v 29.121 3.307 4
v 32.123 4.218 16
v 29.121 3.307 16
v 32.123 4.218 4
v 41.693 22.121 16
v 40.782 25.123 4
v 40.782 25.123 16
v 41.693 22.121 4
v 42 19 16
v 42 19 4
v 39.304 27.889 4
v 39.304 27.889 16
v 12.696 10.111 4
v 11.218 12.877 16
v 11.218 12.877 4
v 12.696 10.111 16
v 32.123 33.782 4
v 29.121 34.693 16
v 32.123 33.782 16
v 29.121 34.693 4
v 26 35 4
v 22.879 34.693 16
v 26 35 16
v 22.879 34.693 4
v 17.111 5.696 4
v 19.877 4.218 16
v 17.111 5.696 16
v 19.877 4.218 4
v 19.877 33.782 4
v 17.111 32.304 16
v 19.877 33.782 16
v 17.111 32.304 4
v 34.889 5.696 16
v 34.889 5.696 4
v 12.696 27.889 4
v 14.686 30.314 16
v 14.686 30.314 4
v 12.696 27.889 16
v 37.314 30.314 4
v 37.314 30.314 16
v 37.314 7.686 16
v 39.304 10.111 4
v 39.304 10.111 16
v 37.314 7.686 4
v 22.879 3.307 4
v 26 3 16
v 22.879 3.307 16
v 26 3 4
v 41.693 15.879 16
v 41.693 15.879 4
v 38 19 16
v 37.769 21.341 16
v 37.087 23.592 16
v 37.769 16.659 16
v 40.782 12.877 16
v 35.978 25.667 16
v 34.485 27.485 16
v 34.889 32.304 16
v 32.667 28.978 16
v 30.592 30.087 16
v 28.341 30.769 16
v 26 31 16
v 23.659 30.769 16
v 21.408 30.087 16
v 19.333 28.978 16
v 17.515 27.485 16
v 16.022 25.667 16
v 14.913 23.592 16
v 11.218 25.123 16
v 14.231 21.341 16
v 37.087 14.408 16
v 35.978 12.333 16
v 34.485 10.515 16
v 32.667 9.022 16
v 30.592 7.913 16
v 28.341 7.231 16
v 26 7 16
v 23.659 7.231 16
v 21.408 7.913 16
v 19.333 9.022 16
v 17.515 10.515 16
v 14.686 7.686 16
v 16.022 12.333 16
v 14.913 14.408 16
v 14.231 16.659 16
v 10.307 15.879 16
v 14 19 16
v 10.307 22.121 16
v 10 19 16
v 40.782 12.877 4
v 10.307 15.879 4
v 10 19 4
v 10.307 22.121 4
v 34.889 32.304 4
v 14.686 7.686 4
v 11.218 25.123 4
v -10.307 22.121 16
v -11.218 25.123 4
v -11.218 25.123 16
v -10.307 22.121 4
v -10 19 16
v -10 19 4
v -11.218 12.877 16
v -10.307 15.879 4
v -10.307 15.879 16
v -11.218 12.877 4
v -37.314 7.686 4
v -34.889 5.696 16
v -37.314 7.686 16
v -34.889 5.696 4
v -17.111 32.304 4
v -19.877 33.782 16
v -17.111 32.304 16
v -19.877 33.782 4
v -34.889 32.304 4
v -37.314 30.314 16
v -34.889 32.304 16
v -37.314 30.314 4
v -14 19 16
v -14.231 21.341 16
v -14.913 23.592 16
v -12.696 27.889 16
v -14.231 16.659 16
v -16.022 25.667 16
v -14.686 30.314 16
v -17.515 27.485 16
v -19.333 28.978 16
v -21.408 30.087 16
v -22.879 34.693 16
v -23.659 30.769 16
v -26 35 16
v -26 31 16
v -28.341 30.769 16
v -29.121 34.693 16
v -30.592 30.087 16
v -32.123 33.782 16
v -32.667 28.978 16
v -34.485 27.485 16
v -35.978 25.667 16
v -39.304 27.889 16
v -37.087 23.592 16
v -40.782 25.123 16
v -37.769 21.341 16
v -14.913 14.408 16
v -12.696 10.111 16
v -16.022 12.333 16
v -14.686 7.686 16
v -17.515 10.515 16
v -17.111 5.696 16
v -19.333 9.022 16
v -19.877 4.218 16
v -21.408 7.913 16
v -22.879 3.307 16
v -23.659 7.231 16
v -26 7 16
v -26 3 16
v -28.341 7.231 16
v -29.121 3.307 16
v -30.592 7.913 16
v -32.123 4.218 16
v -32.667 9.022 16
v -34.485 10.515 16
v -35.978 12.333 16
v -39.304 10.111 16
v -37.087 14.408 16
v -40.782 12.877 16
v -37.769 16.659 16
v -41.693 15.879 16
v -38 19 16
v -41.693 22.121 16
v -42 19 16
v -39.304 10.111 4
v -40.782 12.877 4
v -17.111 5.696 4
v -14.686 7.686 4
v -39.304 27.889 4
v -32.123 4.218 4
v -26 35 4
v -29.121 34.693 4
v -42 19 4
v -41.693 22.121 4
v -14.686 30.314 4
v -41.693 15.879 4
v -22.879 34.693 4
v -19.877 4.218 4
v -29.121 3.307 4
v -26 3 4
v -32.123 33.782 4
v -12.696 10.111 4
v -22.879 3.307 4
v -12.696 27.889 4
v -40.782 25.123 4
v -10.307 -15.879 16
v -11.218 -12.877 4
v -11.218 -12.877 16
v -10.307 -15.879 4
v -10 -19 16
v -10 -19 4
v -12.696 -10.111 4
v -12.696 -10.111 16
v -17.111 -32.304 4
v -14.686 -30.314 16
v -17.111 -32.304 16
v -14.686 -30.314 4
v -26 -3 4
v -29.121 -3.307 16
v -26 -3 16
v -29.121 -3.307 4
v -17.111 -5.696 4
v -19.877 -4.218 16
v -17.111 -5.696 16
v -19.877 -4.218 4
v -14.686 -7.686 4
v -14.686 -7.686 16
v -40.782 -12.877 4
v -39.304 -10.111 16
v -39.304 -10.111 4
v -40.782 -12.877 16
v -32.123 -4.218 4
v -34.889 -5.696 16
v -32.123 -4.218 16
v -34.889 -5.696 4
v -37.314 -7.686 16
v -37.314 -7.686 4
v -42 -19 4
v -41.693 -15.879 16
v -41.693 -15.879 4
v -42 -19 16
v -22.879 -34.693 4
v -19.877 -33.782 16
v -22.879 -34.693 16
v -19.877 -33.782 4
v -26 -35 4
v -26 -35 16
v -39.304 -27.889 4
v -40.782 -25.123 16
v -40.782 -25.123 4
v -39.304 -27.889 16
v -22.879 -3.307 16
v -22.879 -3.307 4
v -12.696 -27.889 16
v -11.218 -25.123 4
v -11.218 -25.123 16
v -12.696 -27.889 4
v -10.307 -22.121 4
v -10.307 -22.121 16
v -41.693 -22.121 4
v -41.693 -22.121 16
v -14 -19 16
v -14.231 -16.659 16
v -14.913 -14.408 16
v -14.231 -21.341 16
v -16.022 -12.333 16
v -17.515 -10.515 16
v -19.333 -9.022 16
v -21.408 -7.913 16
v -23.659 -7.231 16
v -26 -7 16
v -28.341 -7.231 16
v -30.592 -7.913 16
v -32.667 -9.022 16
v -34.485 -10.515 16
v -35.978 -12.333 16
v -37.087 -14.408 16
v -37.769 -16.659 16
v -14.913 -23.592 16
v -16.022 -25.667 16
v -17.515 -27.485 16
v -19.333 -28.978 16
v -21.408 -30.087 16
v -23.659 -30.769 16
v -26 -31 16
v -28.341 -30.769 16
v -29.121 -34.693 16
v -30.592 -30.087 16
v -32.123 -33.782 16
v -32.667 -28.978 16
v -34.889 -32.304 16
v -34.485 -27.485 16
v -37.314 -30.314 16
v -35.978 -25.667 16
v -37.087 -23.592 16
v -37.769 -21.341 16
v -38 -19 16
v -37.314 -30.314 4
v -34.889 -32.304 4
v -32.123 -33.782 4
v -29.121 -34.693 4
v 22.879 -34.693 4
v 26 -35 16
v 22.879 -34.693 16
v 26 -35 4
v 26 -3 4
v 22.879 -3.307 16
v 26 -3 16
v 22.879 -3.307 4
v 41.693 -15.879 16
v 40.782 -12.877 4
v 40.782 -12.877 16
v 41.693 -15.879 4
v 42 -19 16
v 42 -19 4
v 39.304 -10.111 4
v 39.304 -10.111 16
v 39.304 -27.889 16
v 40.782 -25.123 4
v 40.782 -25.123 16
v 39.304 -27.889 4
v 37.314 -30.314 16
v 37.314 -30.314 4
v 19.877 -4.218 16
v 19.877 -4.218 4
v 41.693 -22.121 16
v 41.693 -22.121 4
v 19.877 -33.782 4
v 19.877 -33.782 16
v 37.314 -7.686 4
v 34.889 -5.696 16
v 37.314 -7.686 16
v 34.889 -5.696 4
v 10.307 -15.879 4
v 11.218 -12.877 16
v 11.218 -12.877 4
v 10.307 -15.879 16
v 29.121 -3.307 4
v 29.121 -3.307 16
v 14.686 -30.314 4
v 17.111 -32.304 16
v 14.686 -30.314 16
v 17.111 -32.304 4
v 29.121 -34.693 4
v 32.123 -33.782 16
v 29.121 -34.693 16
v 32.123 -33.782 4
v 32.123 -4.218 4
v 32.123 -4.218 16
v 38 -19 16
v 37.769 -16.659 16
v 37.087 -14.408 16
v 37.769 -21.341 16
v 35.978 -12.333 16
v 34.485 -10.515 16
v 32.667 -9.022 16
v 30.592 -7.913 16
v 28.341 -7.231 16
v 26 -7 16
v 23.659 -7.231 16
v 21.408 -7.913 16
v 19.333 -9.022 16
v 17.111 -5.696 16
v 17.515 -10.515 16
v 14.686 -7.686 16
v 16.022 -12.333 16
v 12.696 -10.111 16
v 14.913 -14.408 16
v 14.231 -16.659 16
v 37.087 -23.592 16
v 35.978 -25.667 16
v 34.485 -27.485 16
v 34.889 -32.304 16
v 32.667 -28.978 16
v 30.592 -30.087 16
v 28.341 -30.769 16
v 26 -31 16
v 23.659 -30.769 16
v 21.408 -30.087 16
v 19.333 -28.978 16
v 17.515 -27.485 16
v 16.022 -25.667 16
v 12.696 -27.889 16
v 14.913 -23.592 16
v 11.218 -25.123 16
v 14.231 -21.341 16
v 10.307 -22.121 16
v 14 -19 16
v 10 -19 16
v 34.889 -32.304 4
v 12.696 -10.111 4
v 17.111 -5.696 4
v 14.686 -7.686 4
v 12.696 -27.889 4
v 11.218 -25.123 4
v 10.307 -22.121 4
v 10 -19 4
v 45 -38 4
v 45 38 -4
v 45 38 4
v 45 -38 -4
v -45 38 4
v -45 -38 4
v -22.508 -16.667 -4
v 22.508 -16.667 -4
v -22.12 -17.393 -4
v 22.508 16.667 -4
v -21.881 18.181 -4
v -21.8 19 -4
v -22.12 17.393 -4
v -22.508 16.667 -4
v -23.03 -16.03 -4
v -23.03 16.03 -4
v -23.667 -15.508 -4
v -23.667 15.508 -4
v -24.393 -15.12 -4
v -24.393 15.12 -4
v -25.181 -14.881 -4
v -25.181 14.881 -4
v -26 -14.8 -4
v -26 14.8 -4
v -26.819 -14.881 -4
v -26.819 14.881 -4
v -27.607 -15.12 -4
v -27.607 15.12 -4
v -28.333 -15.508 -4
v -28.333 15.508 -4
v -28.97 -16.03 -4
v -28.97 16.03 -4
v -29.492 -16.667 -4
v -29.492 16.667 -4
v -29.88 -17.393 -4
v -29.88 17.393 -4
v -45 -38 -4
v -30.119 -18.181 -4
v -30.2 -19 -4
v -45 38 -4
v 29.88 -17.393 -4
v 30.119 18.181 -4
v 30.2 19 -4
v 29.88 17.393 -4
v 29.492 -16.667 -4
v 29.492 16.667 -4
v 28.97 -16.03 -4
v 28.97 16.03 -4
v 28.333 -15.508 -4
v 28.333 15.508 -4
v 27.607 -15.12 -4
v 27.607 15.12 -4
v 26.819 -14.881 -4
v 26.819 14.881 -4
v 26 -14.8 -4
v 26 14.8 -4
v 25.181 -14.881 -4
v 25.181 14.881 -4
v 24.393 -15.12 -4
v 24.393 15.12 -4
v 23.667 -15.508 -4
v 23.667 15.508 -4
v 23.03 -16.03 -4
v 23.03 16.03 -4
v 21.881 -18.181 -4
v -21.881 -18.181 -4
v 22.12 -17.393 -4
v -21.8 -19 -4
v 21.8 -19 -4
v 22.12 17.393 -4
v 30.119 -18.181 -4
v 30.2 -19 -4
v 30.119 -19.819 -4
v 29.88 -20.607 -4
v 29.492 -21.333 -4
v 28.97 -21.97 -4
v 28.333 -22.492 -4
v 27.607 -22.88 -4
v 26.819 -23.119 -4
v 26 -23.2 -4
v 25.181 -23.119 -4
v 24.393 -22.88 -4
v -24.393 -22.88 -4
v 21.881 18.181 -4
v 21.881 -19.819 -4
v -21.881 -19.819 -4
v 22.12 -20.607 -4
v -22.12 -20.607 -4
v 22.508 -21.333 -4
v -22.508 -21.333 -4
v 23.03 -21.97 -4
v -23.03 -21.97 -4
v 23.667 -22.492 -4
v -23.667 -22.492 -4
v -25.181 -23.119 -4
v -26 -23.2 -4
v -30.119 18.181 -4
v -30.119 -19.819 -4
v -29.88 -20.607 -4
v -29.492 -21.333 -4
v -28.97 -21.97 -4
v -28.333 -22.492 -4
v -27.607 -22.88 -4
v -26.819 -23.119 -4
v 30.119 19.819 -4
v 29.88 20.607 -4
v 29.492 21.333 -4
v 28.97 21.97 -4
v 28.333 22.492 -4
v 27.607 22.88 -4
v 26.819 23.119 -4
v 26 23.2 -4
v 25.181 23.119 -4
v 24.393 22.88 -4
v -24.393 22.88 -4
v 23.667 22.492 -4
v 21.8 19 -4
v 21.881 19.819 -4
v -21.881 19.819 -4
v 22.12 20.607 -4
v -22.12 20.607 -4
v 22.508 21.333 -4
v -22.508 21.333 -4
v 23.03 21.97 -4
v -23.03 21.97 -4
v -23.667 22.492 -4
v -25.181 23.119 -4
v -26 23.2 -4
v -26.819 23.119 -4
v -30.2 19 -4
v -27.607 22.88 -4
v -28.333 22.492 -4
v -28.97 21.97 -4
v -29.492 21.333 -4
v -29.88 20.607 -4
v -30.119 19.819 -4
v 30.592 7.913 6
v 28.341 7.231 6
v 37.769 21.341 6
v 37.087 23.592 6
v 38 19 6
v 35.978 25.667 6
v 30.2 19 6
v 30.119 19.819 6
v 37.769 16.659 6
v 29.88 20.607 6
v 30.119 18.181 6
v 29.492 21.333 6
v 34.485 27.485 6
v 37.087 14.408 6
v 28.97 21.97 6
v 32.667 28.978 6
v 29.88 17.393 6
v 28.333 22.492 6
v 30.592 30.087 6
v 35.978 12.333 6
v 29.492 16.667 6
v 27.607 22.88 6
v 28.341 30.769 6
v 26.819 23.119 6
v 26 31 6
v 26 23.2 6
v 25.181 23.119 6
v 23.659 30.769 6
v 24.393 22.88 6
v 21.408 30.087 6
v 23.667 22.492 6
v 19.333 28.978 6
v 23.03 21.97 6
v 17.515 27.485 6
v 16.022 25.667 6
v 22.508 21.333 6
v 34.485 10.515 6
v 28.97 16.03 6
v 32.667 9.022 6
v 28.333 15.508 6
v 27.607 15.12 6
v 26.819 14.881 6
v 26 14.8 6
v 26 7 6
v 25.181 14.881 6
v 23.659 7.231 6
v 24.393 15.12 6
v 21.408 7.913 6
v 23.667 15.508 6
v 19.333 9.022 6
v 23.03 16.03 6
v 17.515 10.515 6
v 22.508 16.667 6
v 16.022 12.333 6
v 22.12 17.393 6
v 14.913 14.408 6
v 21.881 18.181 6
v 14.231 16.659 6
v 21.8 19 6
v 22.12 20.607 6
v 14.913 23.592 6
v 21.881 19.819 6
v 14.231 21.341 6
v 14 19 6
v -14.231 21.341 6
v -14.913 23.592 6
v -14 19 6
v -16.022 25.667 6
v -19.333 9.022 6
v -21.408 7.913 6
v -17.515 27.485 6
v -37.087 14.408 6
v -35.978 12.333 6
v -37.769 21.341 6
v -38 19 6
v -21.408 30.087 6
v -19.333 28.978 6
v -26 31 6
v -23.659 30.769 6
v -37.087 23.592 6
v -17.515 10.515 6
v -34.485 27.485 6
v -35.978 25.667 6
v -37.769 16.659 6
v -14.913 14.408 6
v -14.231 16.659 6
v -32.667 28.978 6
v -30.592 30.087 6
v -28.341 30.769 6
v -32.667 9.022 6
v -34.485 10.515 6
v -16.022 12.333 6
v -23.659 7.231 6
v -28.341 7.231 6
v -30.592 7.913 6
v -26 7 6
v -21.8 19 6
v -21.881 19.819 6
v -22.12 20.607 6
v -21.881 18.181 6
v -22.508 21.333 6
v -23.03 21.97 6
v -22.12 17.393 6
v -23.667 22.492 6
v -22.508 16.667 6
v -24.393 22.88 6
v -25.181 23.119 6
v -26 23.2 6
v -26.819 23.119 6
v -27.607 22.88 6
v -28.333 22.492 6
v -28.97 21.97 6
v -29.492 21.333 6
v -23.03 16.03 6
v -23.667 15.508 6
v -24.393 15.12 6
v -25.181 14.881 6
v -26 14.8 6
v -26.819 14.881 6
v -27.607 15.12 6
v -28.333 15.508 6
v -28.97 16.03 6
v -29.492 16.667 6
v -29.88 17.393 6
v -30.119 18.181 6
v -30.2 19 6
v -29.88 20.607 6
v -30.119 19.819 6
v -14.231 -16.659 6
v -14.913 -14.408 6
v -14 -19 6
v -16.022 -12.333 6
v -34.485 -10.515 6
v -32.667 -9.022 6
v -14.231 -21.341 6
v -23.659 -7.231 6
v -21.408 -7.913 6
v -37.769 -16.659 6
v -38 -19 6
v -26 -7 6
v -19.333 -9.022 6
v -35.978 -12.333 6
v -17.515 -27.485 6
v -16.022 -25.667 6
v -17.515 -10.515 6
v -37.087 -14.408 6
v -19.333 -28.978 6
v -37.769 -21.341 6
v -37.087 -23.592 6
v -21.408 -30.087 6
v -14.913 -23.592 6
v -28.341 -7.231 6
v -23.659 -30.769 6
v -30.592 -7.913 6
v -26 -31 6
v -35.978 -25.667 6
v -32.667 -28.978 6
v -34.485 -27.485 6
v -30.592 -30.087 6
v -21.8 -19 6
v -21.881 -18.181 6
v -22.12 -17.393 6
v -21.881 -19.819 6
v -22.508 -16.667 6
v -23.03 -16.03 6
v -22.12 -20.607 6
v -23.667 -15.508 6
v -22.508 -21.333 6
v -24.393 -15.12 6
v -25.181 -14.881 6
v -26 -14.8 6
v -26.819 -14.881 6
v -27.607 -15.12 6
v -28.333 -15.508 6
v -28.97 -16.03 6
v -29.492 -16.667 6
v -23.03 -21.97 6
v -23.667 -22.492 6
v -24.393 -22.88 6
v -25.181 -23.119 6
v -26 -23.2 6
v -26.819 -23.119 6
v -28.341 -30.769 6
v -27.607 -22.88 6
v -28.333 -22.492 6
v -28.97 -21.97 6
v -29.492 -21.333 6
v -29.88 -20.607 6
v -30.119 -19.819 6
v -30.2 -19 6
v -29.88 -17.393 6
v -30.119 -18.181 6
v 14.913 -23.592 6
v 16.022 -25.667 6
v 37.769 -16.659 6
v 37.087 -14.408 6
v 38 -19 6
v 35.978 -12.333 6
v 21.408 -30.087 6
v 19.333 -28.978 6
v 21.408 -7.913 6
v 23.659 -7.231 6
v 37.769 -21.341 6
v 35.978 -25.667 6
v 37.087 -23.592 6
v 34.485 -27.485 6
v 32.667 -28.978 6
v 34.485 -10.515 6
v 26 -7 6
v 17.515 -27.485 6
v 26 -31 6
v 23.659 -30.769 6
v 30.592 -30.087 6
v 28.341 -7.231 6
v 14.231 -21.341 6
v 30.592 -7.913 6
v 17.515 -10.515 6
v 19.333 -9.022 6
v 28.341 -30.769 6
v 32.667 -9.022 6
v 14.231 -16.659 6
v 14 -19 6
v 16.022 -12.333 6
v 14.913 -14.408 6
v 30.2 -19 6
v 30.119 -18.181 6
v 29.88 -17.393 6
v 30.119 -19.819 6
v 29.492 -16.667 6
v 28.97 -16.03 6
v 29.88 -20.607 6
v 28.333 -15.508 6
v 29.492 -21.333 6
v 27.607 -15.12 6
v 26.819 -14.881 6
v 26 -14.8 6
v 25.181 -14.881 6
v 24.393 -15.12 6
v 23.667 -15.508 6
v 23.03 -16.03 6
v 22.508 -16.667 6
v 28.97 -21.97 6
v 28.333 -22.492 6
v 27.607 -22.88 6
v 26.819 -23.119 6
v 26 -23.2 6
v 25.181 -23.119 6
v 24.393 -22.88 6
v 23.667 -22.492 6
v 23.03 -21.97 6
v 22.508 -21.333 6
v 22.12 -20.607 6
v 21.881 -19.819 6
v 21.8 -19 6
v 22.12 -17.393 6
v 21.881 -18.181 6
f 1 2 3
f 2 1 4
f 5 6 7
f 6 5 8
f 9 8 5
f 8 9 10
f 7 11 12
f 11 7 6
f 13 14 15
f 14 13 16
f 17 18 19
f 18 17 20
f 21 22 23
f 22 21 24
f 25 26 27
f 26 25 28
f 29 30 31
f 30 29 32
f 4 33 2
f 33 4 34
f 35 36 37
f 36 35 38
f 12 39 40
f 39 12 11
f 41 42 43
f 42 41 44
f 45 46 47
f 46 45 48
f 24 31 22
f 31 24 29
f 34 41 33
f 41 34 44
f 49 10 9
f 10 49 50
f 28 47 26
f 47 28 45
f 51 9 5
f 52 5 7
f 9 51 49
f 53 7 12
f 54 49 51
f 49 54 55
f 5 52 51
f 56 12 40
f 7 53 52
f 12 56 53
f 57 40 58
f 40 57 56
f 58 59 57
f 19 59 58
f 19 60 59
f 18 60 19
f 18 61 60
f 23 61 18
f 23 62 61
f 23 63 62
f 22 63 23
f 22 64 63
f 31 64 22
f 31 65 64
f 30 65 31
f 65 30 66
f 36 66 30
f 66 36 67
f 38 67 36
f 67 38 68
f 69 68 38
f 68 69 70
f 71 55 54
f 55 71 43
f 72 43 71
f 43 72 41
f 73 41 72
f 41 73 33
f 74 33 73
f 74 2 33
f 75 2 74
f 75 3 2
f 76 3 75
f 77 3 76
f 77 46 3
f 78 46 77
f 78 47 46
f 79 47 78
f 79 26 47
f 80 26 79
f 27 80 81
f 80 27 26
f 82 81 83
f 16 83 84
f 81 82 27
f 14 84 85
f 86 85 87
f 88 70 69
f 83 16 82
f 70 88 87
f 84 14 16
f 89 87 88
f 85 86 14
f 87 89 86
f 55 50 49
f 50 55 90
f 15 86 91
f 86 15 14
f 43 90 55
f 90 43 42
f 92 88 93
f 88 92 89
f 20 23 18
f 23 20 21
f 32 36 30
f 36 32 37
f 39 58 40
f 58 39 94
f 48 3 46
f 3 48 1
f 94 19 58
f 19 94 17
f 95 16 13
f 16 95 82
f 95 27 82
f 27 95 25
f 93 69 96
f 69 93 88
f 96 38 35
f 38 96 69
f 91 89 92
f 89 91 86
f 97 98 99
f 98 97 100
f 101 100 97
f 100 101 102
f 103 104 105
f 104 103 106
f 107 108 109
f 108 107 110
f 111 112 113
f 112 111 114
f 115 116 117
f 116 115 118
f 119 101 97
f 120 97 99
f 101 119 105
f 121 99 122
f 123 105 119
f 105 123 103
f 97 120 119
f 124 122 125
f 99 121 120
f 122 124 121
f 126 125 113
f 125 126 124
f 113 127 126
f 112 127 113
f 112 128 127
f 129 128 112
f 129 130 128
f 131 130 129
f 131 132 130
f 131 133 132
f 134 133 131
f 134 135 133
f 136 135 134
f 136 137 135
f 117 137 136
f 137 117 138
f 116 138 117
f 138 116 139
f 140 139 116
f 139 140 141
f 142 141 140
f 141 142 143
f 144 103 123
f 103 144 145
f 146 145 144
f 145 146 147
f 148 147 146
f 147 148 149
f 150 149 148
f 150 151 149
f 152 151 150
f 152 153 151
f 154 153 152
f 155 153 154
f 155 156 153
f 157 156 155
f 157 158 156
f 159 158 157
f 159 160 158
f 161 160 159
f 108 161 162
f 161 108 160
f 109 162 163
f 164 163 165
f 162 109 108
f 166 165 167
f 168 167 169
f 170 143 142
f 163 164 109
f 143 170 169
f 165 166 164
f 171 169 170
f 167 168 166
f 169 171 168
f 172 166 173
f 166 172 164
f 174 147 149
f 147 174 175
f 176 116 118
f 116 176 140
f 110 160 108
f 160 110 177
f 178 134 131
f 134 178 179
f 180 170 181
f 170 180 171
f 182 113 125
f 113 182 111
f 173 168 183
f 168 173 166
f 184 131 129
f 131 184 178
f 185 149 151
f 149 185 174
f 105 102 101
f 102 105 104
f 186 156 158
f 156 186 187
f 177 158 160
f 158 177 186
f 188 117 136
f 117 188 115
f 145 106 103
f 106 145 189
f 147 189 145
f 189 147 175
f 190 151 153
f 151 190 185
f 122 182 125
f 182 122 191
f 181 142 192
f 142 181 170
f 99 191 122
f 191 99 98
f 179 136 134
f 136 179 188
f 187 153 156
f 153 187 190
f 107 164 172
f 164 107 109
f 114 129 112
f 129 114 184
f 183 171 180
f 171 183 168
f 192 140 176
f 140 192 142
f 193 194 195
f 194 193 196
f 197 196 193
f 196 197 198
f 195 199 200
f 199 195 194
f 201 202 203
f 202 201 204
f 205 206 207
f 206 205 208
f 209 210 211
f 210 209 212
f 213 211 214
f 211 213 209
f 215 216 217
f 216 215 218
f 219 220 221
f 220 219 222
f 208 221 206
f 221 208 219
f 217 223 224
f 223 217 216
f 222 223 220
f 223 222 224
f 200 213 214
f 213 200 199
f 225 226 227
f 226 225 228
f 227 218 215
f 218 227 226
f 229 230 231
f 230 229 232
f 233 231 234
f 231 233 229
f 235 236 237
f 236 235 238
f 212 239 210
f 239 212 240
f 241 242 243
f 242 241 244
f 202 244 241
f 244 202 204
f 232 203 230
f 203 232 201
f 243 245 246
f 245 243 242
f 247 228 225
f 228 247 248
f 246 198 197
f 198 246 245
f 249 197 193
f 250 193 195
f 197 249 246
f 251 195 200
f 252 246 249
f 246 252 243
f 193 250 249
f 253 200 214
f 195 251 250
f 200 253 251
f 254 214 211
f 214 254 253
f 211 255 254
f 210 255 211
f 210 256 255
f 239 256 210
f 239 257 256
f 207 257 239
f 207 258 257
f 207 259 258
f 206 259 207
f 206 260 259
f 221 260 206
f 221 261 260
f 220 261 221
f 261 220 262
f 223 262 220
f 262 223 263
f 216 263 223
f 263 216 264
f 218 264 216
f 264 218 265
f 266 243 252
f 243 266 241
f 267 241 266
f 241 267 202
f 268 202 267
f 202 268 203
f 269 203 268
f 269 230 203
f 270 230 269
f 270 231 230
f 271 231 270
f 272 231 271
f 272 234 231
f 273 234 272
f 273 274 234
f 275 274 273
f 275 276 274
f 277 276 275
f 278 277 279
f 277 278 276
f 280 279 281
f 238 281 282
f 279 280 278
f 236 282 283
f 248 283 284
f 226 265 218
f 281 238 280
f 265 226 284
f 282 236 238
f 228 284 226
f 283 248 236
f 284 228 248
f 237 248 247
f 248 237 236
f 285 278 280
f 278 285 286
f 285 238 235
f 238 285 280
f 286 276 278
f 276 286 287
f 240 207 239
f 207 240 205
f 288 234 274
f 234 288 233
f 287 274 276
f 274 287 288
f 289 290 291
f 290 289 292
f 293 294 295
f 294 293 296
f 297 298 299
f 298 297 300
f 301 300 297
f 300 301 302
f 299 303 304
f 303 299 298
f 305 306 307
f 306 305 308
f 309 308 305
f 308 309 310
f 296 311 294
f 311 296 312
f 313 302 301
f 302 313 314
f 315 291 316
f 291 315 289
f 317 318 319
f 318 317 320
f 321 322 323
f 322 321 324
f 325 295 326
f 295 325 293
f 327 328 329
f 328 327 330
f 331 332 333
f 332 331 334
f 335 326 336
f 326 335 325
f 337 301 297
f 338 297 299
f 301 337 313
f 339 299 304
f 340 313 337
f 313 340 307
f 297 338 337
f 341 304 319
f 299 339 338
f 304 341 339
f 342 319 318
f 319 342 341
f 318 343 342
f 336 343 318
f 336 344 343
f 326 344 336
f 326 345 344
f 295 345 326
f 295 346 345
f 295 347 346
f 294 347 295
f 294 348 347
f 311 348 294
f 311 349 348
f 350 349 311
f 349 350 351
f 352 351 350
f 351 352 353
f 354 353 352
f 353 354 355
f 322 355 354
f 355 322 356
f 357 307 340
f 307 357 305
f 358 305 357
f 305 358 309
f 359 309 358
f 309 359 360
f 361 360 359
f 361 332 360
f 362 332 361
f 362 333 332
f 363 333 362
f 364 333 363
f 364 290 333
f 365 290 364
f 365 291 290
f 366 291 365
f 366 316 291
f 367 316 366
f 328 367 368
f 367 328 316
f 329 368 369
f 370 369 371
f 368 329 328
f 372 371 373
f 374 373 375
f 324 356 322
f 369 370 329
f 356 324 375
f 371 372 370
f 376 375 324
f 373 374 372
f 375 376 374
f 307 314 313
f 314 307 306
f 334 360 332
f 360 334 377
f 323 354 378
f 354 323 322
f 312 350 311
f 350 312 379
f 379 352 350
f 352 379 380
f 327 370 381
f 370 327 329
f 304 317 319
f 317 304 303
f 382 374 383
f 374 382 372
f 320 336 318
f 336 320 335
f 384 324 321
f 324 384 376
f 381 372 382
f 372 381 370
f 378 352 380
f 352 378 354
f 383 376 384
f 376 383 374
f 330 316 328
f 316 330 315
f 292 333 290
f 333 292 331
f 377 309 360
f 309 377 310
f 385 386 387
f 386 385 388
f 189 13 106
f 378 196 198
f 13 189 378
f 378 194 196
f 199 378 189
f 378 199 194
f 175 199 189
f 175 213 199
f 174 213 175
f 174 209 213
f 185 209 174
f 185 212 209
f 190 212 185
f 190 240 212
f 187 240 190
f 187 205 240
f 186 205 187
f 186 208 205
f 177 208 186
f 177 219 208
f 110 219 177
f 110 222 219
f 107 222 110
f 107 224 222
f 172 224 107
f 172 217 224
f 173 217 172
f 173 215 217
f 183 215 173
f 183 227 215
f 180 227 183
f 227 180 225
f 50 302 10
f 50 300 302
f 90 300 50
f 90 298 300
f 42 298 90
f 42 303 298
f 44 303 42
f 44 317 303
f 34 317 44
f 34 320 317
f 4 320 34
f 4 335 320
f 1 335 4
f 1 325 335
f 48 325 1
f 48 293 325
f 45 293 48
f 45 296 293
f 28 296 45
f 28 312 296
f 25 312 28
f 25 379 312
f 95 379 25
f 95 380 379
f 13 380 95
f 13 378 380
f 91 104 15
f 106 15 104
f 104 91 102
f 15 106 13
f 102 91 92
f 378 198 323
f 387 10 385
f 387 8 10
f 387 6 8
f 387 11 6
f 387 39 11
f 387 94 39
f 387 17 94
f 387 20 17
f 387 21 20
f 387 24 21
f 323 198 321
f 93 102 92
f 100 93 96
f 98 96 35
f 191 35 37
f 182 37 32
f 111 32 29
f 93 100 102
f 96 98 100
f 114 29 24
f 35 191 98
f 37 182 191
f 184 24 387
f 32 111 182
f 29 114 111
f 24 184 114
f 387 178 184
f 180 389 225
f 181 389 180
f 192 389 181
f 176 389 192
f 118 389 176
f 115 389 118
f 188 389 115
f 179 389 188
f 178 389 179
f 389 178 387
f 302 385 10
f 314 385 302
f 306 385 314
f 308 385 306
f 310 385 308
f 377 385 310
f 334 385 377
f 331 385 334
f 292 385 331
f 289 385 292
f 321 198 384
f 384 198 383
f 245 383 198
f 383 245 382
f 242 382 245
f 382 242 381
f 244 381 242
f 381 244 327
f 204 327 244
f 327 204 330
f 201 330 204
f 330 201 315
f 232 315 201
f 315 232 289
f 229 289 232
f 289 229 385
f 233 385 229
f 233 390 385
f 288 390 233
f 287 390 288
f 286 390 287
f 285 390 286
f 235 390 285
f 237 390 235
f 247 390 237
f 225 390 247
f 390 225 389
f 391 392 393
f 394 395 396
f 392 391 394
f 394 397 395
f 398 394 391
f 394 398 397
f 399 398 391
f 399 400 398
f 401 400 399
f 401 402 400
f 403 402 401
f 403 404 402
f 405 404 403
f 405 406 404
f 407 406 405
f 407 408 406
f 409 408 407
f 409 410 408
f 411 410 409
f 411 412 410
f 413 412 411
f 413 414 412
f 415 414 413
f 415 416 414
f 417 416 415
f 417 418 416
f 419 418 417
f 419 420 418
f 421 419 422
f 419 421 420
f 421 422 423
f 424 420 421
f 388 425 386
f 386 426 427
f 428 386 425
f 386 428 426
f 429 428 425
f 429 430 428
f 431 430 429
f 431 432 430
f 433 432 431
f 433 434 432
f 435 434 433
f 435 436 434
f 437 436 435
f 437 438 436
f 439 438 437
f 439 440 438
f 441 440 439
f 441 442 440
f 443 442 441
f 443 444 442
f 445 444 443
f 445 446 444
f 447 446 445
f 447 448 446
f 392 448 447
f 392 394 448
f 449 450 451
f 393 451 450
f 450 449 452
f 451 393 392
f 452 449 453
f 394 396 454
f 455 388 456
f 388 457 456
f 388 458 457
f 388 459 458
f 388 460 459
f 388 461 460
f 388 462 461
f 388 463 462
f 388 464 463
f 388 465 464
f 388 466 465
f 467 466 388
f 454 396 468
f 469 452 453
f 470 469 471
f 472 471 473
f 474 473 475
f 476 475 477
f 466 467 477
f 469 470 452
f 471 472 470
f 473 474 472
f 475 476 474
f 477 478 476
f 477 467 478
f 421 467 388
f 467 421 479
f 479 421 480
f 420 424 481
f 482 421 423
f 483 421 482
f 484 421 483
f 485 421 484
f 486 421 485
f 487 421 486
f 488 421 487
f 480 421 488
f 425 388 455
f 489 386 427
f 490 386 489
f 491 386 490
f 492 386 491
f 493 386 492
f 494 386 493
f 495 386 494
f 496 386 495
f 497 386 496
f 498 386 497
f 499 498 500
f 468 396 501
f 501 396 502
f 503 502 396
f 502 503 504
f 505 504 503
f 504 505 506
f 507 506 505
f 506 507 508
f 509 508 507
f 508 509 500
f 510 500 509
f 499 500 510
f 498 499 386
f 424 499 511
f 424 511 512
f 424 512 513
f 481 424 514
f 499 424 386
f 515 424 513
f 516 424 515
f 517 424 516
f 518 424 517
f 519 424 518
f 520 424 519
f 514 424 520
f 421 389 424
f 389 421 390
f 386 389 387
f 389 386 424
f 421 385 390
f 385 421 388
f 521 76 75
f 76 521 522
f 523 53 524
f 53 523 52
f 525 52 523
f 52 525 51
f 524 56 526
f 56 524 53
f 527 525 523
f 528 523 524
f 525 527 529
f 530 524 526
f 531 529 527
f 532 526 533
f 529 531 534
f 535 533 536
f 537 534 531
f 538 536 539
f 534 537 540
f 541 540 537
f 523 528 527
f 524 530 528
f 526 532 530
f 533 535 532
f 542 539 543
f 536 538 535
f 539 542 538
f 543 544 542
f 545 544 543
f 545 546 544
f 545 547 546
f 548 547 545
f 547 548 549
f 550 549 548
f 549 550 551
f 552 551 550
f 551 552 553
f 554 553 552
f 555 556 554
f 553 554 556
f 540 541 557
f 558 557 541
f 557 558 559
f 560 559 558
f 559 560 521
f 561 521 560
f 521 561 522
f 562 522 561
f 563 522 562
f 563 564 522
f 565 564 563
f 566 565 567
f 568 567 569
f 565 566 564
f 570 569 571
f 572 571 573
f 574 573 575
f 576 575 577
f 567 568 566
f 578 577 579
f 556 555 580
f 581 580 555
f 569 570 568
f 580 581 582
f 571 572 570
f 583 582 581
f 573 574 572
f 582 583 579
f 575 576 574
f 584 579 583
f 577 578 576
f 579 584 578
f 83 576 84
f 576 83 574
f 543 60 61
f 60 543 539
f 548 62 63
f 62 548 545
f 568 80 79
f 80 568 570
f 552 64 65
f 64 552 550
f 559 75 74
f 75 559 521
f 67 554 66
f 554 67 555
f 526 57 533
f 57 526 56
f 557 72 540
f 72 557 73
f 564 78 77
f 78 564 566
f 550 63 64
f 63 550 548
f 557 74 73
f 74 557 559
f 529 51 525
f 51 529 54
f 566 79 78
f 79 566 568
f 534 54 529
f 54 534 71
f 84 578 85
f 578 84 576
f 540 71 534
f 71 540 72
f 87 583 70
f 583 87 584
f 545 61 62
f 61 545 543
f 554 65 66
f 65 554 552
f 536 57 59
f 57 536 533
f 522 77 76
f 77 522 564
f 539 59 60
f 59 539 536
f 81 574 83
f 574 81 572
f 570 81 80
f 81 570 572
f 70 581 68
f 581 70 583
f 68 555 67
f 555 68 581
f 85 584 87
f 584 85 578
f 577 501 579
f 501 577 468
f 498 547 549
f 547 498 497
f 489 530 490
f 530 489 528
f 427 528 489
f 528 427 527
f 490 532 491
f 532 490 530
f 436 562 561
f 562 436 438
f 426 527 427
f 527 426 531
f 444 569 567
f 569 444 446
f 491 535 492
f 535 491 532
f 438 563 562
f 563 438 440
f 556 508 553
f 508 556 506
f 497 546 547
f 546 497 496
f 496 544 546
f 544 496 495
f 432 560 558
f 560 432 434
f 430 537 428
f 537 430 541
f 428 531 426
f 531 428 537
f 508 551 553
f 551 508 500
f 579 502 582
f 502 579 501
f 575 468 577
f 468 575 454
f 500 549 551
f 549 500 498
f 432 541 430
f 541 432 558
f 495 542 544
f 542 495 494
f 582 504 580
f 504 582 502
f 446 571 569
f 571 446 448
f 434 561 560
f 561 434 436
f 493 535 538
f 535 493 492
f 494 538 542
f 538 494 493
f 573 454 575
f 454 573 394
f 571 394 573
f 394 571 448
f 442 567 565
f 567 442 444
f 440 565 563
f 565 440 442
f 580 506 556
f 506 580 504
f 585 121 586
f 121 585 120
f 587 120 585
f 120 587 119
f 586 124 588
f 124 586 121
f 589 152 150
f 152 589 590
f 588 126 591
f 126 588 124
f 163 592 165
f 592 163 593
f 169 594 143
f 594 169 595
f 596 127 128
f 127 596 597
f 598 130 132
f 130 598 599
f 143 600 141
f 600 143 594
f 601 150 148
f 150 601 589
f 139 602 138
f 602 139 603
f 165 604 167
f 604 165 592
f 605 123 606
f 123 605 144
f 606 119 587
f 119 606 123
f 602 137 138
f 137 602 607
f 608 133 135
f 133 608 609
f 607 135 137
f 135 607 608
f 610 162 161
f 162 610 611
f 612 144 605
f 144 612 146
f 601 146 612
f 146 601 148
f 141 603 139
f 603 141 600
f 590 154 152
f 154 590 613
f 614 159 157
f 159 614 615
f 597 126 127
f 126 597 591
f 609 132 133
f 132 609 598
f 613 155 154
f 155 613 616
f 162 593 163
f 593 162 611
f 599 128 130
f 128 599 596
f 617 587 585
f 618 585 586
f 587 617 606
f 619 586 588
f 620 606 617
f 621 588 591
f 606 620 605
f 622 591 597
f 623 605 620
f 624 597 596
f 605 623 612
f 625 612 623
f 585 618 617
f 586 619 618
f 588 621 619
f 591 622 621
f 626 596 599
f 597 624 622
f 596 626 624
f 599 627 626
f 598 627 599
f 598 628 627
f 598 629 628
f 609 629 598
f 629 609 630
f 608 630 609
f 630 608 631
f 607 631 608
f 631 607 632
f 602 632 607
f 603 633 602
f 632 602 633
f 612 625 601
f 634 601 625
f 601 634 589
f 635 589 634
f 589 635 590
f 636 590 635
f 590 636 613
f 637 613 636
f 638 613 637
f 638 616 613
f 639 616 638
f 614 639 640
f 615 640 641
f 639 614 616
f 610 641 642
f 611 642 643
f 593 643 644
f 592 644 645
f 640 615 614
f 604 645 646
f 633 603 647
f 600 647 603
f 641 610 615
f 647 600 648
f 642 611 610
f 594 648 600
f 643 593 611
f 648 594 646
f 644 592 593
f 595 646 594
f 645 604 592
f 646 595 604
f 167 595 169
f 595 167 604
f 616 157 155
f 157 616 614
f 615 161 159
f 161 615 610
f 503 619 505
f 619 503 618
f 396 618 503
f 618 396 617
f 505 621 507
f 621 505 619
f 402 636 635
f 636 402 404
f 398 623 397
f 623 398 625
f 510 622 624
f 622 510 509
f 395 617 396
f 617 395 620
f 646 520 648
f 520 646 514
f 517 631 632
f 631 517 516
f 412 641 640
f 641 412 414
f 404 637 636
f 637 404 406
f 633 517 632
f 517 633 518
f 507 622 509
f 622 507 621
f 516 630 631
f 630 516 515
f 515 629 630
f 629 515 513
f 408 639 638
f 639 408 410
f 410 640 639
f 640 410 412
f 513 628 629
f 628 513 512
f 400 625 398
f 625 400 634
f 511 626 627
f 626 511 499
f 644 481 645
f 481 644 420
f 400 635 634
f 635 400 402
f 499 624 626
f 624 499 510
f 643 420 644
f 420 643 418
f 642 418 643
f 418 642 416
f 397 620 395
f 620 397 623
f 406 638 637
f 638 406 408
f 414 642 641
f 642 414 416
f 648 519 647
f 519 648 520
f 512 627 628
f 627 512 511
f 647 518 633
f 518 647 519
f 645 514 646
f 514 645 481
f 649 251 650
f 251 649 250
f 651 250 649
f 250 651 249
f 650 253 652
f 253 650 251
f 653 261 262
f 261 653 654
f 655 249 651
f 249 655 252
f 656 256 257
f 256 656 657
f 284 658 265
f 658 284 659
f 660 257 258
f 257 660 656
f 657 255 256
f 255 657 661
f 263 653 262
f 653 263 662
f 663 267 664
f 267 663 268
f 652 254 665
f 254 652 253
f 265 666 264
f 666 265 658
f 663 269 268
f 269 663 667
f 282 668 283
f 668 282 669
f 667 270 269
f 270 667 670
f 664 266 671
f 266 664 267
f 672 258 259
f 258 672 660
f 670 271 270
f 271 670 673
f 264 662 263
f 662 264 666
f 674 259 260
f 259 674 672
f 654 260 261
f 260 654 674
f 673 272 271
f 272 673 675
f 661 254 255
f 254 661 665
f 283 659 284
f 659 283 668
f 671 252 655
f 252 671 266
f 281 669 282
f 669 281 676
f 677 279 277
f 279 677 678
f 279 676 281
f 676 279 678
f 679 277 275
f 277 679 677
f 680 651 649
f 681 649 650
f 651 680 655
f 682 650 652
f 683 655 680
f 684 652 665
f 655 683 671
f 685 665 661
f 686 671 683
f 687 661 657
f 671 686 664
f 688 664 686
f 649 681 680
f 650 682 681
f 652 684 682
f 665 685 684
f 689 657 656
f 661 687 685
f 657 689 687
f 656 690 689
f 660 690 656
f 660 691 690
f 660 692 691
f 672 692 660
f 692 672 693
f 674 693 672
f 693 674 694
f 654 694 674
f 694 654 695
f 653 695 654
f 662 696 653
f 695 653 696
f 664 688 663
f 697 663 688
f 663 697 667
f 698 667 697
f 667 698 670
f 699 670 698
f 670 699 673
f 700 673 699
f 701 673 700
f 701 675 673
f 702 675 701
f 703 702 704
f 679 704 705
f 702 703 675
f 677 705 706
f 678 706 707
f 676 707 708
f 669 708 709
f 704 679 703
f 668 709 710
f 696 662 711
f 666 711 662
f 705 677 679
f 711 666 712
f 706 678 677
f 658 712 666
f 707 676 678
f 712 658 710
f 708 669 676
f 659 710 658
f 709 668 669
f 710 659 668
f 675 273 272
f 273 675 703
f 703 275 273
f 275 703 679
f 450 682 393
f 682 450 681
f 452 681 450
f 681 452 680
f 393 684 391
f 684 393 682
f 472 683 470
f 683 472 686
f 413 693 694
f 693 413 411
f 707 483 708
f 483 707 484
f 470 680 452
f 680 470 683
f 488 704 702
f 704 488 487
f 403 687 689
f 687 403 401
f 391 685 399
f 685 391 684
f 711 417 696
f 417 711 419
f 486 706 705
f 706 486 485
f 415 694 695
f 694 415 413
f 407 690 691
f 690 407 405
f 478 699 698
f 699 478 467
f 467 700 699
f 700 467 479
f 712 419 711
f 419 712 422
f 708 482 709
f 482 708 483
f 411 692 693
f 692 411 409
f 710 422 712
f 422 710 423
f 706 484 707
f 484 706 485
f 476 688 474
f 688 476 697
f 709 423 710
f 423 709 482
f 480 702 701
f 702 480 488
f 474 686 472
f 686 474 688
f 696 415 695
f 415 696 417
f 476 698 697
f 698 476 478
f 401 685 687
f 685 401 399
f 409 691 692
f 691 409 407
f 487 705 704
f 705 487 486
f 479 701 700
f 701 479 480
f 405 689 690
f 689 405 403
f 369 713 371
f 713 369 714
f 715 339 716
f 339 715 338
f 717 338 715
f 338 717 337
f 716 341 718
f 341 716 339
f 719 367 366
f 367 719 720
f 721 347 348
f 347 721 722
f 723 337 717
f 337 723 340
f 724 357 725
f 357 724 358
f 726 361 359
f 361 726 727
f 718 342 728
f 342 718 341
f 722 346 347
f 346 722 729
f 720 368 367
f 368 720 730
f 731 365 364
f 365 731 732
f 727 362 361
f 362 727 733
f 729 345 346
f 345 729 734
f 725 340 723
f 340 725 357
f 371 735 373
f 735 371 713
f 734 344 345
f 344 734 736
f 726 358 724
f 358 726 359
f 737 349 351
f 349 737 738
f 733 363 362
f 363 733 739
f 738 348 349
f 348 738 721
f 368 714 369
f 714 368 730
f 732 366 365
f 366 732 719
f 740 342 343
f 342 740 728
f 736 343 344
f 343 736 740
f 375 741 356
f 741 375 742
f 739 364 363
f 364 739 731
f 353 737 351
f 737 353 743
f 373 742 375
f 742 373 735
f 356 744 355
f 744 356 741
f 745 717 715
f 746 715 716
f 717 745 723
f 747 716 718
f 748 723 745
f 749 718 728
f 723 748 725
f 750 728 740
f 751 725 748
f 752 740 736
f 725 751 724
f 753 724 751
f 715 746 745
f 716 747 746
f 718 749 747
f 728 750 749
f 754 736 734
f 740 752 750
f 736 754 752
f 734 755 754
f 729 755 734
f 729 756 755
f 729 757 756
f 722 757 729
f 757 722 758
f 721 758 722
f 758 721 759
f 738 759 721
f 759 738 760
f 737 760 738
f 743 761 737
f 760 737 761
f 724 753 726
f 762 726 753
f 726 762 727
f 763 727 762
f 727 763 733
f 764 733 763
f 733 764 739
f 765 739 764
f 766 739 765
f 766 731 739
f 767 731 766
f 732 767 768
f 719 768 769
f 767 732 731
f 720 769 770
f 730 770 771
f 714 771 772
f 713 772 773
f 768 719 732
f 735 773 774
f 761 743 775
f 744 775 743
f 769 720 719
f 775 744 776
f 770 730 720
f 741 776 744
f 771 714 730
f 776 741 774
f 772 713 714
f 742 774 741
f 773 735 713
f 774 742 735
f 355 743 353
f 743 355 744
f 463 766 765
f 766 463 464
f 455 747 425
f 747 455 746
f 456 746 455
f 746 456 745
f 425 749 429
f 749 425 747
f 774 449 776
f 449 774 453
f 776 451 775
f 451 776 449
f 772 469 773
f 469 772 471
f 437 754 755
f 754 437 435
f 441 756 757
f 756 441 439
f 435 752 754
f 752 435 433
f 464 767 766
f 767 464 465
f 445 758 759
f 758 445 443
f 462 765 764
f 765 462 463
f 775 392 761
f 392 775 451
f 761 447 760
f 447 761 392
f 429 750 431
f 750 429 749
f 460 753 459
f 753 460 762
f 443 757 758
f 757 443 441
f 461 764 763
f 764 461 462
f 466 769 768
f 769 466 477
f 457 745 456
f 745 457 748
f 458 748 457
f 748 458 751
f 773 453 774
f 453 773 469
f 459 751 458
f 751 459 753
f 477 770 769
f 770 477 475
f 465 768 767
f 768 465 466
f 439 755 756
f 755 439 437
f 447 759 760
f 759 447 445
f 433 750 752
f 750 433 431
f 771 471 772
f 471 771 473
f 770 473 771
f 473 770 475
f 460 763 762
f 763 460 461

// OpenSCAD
$fn = 32;

// ----------------------------------------------------------------------
// Socket pad plate
// bosses with counterbored sockets for the screws
// ----------------------------------------------------------------------

// --- parameters (mm) ---
base_t = 8;           // base plate thickness
boss_h = 12;          // boss height above the base plate
boss_d = 32;          // boss diameter
socket_d = 24;        // socket diameter
socket_depth = 10;    // socket depth from the boss face
bolt_d = 8.4;         // screw clearance hole through the socket floor
plate = [90, 76, 8];  // overall size (x, y, z)
edge = 19;            // boss centre offset from the plate edge
pads = 4;             // boss count, one per corner

// --- derived feature positions (mm) ---
height = base_t + boss_h;        // = 20   overall height of the part
corner_x = plate[0] / 2 - edge;  // = 26   boss centre X
corner_y = plate[1] / 2 - edge;  // = 19   boss centre Y
feature_centers = [
  [corner_x, corner_y],
  [-corner_x, corner_y],
  [-corner_x, -corner_y],
  [corner_x, -corner_y]
];   // boss centres: sockets, holes and the pads themselves are placed from here

// base plate, bosses on feature_centers, socket + through hole in each
difference() {
  union() {
    cube(plate, center = true);
    for (centre = feature_centers)
      translate([centre[0], centre[1], plate[2] / 2 - 1])
        cylinder(d = boss_d, h = boss_h + 1);
  }
  for (centre = feature_centers) {
    translate([centre[0], centre[1], plate[2] / 2 + boss_h - socket_depth])
      cylinder(d = socket_d, h = socket_depth + 1);
    translate([centre[0], centre[1], -height])
      cylinder(d = bolt_d, h = 2 * height + 2);  // through the socket floor
  }
}
